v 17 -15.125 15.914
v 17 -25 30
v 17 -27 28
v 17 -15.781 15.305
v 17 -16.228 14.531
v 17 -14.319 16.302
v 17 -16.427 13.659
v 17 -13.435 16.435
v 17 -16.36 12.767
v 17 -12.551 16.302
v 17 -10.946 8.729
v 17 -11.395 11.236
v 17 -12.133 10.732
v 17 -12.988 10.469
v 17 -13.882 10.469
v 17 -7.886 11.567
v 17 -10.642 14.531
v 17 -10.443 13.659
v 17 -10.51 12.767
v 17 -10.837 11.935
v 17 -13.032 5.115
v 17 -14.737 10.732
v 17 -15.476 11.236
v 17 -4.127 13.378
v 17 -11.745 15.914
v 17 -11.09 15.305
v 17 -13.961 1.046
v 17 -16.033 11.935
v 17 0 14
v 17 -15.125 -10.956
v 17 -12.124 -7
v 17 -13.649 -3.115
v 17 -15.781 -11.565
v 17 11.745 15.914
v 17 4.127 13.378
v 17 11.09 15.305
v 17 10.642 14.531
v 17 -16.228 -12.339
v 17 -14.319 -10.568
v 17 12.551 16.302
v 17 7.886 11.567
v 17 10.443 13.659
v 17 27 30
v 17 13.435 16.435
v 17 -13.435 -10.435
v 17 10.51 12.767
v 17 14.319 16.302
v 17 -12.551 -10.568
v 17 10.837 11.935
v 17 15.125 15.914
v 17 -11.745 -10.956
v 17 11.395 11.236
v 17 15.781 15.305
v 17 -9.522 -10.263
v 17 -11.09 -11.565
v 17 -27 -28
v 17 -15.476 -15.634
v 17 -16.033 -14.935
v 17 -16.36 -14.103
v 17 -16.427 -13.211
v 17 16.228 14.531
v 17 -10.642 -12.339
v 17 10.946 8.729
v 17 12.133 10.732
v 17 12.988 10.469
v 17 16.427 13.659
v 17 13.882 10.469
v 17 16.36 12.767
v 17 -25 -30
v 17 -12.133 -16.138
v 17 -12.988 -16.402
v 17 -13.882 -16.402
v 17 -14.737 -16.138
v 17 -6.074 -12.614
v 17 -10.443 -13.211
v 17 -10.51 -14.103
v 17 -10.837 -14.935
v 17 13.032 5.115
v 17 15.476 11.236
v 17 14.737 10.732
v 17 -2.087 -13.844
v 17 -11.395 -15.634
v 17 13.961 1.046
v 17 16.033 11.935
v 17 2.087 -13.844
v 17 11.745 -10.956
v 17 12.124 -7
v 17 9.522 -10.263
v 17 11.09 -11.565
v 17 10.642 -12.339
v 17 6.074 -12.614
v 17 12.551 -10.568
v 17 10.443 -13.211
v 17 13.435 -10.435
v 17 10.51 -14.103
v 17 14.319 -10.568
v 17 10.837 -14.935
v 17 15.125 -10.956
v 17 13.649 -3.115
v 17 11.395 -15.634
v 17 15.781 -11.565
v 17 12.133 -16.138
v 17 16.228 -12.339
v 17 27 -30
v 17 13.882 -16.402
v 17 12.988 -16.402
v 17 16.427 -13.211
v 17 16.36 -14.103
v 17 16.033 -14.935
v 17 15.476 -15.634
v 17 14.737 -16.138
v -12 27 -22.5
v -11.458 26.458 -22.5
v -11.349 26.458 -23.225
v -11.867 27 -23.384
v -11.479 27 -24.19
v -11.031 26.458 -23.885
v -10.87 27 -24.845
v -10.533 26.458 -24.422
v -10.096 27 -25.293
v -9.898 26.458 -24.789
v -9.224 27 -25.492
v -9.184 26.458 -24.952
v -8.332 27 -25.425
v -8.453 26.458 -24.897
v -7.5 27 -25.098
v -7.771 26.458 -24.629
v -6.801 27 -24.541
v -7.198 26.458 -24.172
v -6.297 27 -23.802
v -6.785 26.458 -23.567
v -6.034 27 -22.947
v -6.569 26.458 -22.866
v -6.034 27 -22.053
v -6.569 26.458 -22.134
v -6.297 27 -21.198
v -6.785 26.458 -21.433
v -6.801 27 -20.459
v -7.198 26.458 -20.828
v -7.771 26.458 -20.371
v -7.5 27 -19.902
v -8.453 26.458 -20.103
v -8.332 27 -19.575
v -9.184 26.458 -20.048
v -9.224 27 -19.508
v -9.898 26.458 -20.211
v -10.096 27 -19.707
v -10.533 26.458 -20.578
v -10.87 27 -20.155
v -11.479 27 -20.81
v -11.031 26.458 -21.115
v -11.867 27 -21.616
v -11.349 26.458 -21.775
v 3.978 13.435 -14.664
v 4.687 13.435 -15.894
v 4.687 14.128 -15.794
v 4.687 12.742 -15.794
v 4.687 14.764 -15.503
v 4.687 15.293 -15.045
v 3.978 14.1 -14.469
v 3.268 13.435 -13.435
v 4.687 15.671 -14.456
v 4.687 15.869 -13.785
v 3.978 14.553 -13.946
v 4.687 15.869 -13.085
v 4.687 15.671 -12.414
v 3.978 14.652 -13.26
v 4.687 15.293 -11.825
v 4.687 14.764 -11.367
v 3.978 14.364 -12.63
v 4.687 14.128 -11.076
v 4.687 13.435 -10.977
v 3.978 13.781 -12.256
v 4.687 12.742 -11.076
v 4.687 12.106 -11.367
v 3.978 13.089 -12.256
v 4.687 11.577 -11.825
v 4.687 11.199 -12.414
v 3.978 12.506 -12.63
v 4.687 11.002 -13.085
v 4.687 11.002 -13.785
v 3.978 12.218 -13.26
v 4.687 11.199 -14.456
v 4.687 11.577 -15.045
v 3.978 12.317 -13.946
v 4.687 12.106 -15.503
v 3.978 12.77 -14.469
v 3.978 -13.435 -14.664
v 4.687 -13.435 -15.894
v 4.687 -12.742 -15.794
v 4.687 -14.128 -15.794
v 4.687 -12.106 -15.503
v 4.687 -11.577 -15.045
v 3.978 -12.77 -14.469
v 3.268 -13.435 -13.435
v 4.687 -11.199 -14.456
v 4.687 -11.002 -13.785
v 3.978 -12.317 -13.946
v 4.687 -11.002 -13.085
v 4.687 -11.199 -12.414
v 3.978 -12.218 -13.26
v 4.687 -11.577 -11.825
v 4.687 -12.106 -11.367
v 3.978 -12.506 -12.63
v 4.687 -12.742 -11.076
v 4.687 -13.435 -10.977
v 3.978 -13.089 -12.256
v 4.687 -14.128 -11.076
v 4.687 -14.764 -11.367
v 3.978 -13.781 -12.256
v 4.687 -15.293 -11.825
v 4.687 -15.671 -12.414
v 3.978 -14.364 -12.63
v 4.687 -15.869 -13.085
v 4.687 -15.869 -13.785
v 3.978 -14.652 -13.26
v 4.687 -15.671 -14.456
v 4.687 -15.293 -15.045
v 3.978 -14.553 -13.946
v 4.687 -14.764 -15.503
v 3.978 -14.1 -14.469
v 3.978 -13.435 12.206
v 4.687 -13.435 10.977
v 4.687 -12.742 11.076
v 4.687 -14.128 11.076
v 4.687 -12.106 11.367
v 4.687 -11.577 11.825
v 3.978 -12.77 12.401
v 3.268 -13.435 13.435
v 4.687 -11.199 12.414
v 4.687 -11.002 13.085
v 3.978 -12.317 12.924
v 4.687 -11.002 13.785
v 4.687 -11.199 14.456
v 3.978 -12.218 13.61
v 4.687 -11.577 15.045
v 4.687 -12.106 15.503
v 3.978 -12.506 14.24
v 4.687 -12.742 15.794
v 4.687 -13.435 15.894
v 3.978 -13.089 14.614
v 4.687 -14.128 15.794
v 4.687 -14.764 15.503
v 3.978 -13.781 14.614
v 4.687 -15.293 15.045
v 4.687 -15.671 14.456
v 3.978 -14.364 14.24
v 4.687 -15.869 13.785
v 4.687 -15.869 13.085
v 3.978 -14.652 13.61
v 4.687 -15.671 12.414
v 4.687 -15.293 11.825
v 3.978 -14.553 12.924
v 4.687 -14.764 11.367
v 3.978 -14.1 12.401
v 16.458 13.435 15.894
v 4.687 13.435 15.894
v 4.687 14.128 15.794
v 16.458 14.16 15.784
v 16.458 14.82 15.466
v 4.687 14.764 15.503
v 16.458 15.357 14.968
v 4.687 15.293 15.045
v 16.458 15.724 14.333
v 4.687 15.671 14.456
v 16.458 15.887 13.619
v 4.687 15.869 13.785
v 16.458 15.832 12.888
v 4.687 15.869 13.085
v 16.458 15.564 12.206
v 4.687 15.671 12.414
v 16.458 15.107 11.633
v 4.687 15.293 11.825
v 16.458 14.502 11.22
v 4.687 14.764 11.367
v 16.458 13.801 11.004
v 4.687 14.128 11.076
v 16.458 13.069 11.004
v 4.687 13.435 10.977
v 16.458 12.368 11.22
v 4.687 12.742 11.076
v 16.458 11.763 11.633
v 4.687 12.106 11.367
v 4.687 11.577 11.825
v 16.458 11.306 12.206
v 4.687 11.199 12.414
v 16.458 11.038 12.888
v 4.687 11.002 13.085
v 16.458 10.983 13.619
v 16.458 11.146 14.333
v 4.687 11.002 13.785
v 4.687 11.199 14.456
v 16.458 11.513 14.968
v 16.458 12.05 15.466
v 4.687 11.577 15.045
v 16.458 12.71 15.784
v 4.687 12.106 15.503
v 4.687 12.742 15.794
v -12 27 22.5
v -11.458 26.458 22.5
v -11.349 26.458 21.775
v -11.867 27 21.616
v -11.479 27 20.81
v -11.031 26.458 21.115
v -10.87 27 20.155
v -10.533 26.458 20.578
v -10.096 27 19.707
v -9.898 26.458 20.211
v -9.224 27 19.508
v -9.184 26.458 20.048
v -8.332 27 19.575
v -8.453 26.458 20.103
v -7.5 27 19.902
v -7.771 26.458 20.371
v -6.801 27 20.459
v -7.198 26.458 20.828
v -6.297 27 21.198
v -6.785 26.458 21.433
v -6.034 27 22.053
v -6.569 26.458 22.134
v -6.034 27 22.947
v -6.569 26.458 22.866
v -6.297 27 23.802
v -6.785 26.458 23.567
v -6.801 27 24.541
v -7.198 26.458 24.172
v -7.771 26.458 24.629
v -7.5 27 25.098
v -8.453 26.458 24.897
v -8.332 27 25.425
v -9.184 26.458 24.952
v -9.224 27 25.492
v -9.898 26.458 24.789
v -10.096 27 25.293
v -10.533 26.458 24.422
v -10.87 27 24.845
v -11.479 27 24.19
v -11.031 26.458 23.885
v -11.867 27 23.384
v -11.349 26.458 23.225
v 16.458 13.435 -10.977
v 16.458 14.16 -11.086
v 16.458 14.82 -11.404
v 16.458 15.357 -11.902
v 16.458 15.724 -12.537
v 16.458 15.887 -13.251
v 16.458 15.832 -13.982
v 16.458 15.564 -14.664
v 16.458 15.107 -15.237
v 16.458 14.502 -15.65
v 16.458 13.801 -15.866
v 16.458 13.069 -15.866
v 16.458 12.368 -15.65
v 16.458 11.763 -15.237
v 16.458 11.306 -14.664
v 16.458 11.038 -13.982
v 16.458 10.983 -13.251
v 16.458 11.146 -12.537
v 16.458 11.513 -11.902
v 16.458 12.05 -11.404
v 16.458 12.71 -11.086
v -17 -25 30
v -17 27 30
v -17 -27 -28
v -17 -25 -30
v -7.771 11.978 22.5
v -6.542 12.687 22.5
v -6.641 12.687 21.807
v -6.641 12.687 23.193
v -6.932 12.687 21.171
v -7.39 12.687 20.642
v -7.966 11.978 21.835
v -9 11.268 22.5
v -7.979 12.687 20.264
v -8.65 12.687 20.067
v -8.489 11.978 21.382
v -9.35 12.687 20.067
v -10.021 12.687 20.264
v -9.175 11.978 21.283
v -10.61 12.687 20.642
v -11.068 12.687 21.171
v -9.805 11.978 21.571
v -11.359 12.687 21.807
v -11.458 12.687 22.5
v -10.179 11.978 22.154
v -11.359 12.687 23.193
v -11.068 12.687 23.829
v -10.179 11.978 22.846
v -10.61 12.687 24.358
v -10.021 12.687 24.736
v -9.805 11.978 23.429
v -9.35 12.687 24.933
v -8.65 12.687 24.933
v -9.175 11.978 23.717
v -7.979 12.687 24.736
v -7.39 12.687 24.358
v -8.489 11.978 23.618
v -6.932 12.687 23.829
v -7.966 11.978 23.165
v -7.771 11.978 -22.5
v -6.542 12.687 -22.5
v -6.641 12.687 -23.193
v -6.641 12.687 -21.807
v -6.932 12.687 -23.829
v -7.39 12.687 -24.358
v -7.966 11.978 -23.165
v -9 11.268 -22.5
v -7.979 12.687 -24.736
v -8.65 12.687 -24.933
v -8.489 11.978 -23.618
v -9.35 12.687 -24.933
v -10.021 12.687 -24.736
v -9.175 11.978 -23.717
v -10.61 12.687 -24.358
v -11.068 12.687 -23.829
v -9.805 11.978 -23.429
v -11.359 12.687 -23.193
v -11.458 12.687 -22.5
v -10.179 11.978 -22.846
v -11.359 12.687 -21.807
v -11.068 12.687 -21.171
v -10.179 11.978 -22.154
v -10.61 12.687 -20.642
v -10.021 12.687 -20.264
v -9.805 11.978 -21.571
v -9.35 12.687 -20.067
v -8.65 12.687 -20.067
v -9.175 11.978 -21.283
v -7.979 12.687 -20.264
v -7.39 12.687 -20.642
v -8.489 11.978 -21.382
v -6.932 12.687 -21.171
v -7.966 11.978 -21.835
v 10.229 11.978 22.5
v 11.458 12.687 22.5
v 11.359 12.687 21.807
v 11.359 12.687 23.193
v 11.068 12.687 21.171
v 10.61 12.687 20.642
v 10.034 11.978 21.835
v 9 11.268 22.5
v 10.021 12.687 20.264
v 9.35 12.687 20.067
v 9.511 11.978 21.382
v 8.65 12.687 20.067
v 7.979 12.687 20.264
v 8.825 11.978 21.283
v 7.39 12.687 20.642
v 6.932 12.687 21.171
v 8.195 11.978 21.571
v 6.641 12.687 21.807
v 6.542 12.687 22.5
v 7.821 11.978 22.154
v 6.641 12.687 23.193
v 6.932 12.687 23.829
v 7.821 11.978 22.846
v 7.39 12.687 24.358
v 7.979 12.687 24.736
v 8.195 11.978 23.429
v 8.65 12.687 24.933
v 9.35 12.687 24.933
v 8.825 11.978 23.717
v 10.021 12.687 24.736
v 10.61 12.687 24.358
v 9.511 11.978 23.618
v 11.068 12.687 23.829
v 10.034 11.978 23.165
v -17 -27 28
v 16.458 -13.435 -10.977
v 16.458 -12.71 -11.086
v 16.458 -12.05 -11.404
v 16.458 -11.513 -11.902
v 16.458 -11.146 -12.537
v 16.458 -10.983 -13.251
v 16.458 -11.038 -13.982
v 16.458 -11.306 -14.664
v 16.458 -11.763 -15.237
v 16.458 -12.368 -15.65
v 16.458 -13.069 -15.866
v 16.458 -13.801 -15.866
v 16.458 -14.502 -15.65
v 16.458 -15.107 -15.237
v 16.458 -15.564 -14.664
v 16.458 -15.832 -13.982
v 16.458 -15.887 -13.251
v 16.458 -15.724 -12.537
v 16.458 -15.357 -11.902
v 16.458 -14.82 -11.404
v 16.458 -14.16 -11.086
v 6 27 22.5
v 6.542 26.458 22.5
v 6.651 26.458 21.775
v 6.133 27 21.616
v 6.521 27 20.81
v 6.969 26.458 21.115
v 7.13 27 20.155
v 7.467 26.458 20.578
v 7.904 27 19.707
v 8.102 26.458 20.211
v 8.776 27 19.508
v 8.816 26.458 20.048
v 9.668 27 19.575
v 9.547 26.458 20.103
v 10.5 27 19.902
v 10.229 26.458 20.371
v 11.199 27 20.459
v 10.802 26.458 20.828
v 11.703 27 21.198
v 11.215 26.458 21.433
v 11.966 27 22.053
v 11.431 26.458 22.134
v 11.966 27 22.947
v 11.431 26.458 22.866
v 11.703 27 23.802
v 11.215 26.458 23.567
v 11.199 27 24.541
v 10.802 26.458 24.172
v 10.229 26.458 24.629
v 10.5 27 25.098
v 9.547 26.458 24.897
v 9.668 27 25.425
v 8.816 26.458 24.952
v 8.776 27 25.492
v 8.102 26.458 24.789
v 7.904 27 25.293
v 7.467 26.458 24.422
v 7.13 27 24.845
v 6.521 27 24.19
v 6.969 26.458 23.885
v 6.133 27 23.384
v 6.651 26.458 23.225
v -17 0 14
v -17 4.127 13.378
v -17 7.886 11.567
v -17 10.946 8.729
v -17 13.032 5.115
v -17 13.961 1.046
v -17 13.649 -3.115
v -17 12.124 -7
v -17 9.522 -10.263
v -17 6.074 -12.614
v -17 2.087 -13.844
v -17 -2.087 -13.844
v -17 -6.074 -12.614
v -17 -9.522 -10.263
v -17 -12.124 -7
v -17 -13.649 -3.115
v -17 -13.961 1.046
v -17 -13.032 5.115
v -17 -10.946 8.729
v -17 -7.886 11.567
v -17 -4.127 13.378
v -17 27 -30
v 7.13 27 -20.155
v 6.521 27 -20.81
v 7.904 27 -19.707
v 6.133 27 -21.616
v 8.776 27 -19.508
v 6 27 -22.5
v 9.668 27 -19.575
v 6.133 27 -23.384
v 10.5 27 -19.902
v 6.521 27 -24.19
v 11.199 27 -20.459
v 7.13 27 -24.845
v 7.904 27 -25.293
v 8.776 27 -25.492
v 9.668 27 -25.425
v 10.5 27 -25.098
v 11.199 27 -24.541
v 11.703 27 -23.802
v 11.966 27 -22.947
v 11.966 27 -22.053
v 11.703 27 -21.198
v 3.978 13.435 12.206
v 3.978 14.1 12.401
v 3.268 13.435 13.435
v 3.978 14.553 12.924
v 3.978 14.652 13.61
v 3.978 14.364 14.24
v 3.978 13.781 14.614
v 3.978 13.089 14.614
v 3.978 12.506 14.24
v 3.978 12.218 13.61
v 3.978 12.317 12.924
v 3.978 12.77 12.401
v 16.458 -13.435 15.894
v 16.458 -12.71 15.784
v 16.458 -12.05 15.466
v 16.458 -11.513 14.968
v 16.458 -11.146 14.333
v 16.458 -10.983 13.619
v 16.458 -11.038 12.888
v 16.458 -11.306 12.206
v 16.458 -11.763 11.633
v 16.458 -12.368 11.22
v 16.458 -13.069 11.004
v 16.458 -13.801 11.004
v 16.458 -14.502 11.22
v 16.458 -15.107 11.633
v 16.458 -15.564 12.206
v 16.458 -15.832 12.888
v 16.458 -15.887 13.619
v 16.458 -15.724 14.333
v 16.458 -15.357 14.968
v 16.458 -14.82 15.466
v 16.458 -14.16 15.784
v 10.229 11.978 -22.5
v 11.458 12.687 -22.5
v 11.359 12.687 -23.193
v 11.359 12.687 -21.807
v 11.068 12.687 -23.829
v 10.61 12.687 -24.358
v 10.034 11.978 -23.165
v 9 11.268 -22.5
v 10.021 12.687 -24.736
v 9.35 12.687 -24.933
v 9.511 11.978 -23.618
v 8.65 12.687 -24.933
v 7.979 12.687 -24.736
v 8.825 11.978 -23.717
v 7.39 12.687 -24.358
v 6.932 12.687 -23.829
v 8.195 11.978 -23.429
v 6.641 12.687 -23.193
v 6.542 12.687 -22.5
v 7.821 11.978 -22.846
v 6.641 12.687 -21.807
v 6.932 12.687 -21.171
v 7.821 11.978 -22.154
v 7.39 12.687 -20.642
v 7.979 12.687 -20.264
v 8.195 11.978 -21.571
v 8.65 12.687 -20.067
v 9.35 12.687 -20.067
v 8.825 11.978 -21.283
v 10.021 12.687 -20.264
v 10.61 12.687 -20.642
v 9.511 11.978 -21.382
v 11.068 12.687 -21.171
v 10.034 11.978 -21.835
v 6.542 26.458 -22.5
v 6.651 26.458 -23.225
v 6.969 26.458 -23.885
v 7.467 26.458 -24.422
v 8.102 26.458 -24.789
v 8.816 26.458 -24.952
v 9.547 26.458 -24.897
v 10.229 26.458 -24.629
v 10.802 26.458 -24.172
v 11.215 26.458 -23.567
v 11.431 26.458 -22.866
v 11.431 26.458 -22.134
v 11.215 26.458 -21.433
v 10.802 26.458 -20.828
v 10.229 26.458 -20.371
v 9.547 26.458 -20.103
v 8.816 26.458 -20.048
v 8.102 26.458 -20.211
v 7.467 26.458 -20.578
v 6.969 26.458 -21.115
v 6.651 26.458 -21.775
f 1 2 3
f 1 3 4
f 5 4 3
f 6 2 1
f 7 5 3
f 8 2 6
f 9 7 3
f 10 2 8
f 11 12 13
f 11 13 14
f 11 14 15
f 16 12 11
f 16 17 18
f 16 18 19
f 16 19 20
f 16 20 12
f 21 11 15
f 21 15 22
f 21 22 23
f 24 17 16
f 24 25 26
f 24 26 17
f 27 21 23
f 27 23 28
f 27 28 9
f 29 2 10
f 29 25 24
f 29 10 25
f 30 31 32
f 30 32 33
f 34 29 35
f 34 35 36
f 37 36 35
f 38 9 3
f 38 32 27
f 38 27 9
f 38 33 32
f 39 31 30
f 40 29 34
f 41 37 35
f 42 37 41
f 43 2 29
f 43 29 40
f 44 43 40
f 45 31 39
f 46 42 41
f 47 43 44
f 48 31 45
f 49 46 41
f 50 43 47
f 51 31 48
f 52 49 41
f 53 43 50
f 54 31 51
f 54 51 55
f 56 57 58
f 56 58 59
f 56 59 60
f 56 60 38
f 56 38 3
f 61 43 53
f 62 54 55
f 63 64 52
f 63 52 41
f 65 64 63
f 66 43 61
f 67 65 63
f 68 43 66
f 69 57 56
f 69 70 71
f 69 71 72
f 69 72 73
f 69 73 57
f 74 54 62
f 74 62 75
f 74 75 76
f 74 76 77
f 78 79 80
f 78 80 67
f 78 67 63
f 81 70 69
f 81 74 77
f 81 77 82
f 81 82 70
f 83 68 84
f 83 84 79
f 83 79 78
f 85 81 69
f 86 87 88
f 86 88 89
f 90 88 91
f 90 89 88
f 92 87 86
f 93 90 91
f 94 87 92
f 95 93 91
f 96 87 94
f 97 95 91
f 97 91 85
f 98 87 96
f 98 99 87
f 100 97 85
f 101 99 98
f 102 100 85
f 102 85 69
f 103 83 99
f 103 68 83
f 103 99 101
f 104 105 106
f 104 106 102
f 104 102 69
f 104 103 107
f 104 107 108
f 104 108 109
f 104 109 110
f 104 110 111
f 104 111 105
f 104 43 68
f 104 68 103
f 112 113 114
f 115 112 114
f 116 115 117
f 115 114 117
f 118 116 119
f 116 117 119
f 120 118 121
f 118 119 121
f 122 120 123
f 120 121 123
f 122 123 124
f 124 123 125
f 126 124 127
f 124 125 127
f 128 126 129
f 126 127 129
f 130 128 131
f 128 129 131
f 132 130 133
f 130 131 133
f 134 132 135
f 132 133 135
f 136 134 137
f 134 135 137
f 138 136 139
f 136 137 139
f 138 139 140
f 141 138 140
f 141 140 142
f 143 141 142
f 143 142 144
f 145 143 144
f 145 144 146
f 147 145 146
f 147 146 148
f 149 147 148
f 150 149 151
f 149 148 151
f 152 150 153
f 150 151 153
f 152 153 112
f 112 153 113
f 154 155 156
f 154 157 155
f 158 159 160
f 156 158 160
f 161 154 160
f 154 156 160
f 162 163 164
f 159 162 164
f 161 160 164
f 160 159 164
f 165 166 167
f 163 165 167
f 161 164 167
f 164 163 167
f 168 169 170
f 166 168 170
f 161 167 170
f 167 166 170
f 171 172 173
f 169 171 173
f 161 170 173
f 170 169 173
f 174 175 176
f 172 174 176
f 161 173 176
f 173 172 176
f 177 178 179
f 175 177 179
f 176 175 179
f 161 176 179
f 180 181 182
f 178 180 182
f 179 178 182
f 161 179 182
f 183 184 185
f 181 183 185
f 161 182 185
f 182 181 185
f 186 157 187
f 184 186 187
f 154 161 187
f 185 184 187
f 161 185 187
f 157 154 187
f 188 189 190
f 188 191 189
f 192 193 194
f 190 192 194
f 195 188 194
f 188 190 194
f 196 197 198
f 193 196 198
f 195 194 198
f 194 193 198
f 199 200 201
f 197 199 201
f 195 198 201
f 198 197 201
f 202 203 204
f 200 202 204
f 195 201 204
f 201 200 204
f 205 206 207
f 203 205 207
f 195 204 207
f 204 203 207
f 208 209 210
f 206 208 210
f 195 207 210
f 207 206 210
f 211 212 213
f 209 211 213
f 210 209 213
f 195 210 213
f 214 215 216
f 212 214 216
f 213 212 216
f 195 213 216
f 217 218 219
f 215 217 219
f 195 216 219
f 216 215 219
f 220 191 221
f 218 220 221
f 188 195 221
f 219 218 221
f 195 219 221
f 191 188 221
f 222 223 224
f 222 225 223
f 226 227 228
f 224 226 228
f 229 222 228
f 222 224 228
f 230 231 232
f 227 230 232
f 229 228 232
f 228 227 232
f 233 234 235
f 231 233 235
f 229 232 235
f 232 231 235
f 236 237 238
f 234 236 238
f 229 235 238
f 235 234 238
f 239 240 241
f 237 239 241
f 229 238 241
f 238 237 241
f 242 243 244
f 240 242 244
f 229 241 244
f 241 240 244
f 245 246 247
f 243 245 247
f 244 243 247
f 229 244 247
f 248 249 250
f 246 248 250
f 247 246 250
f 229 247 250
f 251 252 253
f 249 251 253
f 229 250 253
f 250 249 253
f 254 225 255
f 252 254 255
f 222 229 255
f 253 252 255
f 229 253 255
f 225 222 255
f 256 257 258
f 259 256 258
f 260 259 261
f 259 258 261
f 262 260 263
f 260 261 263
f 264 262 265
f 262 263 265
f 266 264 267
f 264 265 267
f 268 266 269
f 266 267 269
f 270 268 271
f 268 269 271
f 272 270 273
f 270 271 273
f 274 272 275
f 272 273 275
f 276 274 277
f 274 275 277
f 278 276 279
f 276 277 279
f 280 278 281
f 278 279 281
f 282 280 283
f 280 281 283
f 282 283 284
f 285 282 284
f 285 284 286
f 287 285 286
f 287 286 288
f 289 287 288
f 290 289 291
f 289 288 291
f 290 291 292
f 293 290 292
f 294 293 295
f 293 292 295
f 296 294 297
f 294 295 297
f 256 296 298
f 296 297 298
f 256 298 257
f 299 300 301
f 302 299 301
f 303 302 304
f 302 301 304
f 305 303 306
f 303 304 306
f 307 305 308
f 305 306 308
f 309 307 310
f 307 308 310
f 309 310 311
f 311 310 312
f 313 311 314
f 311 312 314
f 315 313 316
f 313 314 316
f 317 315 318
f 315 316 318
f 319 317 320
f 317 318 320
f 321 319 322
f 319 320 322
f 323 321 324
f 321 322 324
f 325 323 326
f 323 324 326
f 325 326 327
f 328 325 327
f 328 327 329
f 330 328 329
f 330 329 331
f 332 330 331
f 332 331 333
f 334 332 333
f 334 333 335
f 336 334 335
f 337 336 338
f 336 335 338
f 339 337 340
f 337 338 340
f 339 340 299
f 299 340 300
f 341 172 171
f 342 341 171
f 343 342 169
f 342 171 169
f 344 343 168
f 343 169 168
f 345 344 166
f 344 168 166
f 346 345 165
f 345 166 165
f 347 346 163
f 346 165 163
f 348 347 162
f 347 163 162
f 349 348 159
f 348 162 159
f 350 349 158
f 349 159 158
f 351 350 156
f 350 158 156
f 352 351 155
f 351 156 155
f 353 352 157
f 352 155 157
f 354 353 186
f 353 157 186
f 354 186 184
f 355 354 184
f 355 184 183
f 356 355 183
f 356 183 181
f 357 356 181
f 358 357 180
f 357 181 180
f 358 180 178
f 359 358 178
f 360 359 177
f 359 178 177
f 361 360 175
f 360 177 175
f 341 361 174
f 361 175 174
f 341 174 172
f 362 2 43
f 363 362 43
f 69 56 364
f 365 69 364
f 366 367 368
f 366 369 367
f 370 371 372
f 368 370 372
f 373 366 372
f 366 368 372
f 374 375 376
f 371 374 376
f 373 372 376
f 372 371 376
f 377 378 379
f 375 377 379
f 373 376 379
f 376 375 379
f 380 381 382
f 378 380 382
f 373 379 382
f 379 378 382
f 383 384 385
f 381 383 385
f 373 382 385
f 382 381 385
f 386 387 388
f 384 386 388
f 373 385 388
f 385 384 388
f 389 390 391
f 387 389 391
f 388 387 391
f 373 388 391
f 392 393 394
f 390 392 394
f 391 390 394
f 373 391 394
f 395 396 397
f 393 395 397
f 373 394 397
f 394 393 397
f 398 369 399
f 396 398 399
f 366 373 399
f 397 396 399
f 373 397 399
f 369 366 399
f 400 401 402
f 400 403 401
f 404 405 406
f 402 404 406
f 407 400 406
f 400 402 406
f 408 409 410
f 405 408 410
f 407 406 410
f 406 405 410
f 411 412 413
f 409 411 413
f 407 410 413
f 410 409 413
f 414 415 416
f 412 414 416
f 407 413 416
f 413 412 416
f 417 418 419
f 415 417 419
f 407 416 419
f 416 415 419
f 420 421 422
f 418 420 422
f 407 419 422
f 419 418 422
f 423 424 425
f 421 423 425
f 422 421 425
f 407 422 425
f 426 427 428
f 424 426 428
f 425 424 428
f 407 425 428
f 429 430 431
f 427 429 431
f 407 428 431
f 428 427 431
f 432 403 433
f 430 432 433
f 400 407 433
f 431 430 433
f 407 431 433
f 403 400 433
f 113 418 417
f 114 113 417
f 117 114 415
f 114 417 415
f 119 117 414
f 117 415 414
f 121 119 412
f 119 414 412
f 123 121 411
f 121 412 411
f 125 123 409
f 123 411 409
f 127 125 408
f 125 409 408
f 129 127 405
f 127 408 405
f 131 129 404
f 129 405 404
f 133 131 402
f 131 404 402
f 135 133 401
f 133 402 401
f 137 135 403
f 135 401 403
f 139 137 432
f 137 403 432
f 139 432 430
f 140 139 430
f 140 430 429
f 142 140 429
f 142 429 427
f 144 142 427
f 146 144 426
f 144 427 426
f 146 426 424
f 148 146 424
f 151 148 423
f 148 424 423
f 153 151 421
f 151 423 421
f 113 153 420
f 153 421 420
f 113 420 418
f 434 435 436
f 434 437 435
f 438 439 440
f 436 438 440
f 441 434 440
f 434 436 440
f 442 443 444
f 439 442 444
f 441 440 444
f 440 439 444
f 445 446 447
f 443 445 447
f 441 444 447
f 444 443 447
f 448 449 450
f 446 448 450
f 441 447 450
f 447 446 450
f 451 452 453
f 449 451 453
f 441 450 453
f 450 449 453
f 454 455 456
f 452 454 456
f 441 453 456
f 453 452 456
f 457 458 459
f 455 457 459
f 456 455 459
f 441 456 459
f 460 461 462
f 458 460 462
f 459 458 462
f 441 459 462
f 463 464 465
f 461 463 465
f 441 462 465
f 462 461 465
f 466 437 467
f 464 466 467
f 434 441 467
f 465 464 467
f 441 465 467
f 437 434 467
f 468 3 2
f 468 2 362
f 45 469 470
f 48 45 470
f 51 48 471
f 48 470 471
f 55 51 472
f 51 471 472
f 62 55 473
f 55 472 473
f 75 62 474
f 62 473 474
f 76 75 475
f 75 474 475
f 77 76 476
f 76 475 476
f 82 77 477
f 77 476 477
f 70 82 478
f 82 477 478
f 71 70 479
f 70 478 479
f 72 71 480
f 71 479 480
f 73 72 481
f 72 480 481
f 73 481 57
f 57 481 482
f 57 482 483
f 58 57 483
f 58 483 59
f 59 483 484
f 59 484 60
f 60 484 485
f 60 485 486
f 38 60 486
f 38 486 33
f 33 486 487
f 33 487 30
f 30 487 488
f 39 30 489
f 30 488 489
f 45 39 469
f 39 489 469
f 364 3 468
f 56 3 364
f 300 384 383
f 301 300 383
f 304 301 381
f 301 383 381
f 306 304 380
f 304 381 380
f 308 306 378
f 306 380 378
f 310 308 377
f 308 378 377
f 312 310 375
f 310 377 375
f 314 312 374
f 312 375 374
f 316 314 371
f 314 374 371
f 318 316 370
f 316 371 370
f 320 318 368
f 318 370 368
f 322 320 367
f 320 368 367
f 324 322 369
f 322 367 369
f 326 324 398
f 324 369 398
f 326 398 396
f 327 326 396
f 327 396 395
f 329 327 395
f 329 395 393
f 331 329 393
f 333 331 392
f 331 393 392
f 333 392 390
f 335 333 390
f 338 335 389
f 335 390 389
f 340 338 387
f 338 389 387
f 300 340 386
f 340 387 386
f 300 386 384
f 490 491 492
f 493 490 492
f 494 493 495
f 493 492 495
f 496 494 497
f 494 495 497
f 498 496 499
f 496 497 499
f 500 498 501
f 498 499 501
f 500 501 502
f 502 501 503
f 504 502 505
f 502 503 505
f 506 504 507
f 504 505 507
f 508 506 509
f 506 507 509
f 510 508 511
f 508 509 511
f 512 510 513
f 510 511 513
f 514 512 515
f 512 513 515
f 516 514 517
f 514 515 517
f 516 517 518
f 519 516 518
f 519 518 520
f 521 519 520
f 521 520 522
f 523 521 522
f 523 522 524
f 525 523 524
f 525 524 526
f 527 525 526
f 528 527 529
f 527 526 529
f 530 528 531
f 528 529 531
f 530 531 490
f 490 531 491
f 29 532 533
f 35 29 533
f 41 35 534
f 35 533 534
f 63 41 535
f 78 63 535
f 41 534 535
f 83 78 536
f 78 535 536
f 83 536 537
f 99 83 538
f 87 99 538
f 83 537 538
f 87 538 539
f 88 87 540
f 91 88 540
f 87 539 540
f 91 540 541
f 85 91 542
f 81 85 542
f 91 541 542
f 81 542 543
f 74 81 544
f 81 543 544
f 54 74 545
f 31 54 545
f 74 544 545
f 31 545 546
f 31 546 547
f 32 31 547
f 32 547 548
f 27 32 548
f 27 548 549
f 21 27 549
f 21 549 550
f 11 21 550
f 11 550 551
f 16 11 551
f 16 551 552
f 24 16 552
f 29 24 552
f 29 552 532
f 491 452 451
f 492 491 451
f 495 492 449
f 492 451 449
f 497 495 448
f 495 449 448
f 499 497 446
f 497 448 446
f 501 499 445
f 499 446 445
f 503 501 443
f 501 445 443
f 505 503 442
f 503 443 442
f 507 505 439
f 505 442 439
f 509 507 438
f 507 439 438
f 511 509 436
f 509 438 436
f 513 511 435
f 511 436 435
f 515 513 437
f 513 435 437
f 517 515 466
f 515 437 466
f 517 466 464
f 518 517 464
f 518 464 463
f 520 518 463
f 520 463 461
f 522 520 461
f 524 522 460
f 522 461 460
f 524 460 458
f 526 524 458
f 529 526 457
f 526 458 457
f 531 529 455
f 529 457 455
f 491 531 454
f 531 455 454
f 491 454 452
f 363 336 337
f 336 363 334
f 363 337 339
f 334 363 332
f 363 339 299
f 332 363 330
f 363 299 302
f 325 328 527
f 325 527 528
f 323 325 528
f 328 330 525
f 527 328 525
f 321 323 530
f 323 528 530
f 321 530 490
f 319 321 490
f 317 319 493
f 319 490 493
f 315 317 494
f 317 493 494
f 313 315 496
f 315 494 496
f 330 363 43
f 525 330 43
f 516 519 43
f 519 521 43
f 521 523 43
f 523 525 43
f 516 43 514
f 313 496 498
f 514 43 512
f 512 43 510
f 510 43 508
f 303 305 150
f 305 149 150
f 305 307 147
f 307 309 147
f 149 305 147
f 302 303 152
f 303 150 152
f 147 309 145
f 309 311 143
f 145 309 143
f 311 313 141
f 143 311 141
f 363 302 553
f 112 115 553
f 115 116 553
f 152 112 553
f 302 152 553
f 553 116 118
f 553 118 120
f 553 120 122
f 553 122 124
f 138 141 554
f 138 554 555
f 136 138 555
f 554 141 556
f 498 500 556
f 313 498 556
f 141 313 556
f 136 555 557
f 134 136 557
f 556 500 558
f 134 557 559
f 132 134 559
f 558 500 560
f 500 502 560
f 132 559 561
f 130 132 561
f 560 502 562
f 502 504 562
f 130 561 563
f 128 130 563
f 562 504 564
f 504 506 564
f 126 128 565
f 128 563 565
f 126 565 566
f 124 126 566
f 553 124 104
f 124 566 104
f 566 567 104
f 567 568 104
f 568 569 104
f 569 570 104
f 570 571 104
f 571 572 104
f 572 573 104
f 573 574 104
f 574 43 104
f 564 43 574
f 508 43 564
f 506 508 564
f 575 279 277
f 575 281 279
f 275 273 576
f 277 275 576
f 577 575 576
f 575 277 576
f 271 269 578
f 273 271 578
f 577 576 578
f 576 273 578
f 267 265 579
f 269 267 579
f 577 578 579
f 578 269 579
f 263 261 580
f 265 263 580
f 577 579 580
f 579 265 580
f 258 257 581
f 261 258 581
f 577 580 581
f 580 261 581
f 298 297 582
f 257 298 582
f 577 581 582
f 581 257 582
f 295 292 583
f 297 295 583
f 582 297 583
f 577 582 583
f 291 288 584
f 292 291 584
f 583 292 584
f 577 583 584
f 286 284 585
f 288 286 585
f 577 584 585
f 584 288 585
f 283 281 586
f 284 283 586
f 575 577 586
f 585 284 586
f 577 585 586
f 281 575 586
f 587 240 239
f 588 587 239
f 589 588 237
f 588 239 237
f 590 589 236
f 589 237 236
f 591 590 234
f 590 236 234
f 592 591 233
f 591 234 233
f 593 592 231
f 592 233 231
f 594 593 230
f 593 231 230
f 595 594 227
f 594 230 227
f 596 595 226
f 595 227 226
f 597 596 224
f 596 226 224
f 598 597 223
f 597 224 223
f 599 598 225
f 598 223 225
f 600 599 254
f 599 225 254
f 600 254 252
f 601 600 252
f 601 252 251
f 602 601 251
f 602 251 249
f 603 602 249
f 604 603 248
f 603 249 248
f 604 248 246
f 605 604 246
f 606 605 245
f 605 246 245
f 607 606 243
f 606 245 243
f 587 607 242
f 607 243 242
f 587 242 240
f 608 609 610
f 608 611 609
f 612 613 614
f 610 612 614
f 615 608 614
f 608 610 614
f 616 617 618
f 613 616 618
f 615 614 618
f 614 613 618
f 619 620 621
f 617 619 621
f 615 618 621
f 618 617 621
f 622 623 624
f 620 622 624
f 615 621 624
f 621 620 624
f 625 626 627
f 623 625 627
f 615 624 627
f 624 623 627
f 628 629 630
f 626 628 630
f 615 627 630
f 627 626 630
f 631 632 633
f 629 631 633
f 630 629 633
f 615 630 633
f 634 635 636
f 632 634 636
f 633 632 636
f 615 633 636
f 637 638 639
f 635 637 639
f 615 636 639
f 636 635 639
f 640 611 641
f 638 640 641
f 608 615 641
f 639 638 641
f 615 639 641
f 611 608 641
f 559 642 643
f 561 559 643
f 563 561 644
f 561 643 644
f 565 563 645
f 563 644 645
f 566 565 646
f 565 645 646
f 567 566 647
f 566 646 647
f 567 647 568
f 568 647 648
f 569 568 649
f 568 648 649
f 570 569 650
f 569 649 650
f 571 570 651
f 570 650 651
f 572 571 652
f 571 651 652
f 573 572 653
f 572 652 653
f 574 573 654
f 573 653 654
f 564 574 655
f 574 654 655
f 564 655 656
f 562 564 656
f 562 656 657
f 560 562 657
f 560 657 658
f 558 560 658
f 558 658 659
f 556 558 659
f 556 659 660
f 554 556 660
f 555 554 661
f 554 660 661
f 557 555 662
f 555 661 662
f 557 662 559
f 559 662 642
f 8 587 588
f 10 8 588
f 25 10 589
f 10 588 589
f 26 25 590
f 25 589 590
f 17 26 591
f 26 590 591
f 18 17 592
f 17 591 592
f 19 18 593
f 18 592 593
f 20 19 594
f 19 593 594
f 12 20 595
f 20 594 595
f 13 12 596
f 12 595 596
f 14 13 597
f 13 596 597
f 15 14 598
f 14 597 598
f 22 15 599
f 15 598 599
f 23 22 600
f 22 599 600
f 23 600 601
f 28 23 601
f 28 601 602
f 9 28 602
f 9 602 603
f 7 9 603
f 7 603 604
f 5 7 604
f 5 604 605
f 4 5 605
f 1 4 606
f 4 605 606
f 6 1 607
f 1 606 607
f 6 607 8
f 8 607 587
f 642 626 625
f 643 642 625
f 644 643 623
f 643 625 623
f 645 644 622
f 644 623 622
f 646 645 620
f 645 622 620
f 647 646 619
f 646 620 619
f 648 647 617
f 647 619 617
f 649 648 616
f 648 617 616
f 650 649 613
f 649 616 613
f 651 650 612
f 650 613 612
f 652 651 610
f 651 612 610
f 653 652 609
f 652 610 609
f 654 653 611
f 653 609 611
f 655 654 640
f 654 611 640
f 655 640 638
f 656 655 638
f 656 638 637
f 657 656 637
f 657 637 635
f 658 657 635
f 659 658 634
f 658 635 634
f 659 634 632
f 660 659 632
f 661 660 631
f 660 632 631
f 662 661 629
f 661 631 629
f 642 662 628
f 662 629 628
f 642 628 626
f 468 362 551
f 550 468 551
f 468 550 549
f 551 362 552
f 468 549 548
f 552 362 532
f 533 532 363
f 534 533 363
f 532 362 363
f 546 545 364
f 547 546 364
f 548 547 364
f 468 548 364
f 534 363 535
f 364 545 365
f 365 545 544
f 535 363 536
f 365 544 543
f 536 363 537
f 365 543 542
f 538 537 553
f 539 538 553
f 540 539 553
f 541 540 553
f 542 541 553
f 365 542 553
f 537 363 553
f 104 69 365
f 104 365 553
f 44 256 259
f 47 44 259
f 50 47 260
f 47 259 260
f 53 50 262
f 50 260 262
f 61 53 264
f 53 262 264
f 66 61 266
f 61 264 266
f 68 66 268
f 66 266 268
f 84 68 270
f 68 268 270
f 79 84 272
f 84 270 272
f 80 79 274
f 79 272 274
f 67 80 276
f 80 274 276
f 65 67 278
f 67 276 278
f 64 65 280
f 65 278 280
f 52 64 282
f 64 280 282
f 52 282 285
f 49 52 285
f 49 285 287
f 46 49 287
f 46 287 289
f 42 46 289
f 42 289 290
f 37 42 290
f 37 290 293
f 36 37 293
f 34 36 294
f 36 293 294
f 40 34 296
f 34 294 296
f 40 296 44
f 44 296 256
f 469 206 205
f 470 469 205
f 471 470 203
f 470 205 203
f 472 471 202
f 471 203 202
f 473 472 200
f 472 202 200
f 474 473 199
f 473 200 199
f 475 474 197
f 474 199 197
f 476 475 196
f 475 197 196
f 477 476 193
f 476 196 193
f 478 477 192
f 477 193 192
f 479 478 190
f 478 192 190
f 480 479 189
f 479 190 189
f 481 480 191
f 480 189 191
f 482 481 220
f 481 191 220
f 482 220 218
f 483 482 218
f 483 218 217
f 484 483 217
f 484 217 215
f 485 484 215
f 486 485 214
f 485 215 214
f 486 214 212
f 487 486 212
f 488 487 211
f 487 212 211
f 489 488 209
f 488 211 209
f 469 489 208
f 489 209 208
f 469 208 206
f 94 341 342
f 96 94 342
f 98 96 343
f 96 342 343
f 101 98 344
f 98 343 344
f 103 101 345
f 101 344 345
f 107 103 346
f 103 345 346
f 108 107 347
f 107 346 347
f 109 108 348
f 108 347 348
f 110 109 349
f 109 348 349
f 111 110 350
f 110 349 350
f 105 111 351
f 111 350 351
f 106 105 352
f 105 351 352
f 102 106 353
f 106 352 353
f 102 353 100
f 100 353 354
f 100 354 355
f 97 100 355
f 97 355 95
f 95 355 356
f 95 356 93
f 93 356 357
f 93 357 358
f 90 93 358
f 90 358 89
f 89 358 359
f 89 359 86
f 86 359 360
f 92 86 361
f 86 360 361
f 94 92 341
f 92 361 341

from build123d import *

# Parameters (mm, degrees)
SCHIZZO1_W                   = 60
SCHIZZO1_H                   = 54
ESTRUSIONE_ESTRUSIONE1_DEPTH = 34
FORO_PER_VITE_M24_1_D        = 28
FORO1_D                      = 4.917
FORO1_DEPTH                  = 14.312635171
FORO1_TIP                    = 1.419415637
FORO2_D                      = 4.917
FORO2_DEPTH                  = 12.312635171
FORO2_TIP                    = 1.419415637
SMUSSO1_SIZE                 = 0.5415
SMUSSO2_SIZE                 = 2


with BuildPart() as part:
    # Schizzo1 → Estrusione-Estrusione1 (new body)
    with BuildSketch(Plane(origin=(17, 0, 0), x_dir=(0, 0, -1), z_dir=(1, 0, 0))):
        Rectangle(SCHIZZO1_W, SCHIZZO1_H)
    extrude(amount=-ESTRUSIONE_ESTRUSIONE1_DEPTH)

    # Foro per Vite M24-1 (through all)
    with Locations(Plane(origin=(17, 0, 0), x_dir=(0, 0, -1), z_dir=(1, 0, 0))):
        with Locations((0, 0)):
            Hole(FORO_PER_VITE_M24_1_D / 2)

    # Foro1
    with Locations(Plane(origin=(0, 27, 0), x_dir=(1, 0, 0), z_dir=(0, 1, 0))):
        with Locations((9, 22.5), (9, -22.5), (-9, 22.5), (-9, -22.5)):
            Hole(FORO1_D / 2, depth=FORO1_DEPTH)
            with Locations((0, 0, -(FORO1_DEPTH + FORO1_TIP / 2))):  # 120° drill point
                Cone(0, FORO1_D / 2, FORO1_TIP, mode=Mode.SUBTRACT)

    # Foro2
    with Locations(Plane(origin=(17, 0, 0), x_dir=(0, 0, -1), z_dir=(1, 0, 0))):
        with Locations((13.435028843, 13.435028843), (-13.435028843, -13.435028843), (13.435028843, -13.435028843), (-13.435028843, 13.435028843)):
            Hole(FORO2_D / 2, depth=FORO2_DEPTH)
            with Locations((0, 0, -(FORO2_DEPTH + FORO2_TIP / 2))):  # 120° drill point
                Cone(0, FORO2_D / 2, FORO2_TIP, mode=Mode.SUBTRACT)

    # Smusso1
    smusso1_edges = [part.edges().sort_by_distance(p)[0] for p in [
        (-6.5415, 27, 22.5),
        (-6.5415, 27, -22.5),
        (11.4585, 27, 22.5),
        (11.4585, 27, -22.5),
        (17, 13.435028843, 10.976528843),
        (17, -13.435028843, -15.893528843),
        (17, -13.435028843, 10.976528843),
        (17, 13.435028843, -15.893528843),
    ]]
    chamfer(smusso1_edges, length=SMUSSO1_SIZE)

    # Smusso2
    smusso2_edges = [part.edges().sort_by_distance(p)[0] for p in [
        (0, -27, 30),
        (0, -27, -30),
    ]]
    chamfer(smusso2_edges, length=SMUSSO2_SIZE)


solid = part.part
